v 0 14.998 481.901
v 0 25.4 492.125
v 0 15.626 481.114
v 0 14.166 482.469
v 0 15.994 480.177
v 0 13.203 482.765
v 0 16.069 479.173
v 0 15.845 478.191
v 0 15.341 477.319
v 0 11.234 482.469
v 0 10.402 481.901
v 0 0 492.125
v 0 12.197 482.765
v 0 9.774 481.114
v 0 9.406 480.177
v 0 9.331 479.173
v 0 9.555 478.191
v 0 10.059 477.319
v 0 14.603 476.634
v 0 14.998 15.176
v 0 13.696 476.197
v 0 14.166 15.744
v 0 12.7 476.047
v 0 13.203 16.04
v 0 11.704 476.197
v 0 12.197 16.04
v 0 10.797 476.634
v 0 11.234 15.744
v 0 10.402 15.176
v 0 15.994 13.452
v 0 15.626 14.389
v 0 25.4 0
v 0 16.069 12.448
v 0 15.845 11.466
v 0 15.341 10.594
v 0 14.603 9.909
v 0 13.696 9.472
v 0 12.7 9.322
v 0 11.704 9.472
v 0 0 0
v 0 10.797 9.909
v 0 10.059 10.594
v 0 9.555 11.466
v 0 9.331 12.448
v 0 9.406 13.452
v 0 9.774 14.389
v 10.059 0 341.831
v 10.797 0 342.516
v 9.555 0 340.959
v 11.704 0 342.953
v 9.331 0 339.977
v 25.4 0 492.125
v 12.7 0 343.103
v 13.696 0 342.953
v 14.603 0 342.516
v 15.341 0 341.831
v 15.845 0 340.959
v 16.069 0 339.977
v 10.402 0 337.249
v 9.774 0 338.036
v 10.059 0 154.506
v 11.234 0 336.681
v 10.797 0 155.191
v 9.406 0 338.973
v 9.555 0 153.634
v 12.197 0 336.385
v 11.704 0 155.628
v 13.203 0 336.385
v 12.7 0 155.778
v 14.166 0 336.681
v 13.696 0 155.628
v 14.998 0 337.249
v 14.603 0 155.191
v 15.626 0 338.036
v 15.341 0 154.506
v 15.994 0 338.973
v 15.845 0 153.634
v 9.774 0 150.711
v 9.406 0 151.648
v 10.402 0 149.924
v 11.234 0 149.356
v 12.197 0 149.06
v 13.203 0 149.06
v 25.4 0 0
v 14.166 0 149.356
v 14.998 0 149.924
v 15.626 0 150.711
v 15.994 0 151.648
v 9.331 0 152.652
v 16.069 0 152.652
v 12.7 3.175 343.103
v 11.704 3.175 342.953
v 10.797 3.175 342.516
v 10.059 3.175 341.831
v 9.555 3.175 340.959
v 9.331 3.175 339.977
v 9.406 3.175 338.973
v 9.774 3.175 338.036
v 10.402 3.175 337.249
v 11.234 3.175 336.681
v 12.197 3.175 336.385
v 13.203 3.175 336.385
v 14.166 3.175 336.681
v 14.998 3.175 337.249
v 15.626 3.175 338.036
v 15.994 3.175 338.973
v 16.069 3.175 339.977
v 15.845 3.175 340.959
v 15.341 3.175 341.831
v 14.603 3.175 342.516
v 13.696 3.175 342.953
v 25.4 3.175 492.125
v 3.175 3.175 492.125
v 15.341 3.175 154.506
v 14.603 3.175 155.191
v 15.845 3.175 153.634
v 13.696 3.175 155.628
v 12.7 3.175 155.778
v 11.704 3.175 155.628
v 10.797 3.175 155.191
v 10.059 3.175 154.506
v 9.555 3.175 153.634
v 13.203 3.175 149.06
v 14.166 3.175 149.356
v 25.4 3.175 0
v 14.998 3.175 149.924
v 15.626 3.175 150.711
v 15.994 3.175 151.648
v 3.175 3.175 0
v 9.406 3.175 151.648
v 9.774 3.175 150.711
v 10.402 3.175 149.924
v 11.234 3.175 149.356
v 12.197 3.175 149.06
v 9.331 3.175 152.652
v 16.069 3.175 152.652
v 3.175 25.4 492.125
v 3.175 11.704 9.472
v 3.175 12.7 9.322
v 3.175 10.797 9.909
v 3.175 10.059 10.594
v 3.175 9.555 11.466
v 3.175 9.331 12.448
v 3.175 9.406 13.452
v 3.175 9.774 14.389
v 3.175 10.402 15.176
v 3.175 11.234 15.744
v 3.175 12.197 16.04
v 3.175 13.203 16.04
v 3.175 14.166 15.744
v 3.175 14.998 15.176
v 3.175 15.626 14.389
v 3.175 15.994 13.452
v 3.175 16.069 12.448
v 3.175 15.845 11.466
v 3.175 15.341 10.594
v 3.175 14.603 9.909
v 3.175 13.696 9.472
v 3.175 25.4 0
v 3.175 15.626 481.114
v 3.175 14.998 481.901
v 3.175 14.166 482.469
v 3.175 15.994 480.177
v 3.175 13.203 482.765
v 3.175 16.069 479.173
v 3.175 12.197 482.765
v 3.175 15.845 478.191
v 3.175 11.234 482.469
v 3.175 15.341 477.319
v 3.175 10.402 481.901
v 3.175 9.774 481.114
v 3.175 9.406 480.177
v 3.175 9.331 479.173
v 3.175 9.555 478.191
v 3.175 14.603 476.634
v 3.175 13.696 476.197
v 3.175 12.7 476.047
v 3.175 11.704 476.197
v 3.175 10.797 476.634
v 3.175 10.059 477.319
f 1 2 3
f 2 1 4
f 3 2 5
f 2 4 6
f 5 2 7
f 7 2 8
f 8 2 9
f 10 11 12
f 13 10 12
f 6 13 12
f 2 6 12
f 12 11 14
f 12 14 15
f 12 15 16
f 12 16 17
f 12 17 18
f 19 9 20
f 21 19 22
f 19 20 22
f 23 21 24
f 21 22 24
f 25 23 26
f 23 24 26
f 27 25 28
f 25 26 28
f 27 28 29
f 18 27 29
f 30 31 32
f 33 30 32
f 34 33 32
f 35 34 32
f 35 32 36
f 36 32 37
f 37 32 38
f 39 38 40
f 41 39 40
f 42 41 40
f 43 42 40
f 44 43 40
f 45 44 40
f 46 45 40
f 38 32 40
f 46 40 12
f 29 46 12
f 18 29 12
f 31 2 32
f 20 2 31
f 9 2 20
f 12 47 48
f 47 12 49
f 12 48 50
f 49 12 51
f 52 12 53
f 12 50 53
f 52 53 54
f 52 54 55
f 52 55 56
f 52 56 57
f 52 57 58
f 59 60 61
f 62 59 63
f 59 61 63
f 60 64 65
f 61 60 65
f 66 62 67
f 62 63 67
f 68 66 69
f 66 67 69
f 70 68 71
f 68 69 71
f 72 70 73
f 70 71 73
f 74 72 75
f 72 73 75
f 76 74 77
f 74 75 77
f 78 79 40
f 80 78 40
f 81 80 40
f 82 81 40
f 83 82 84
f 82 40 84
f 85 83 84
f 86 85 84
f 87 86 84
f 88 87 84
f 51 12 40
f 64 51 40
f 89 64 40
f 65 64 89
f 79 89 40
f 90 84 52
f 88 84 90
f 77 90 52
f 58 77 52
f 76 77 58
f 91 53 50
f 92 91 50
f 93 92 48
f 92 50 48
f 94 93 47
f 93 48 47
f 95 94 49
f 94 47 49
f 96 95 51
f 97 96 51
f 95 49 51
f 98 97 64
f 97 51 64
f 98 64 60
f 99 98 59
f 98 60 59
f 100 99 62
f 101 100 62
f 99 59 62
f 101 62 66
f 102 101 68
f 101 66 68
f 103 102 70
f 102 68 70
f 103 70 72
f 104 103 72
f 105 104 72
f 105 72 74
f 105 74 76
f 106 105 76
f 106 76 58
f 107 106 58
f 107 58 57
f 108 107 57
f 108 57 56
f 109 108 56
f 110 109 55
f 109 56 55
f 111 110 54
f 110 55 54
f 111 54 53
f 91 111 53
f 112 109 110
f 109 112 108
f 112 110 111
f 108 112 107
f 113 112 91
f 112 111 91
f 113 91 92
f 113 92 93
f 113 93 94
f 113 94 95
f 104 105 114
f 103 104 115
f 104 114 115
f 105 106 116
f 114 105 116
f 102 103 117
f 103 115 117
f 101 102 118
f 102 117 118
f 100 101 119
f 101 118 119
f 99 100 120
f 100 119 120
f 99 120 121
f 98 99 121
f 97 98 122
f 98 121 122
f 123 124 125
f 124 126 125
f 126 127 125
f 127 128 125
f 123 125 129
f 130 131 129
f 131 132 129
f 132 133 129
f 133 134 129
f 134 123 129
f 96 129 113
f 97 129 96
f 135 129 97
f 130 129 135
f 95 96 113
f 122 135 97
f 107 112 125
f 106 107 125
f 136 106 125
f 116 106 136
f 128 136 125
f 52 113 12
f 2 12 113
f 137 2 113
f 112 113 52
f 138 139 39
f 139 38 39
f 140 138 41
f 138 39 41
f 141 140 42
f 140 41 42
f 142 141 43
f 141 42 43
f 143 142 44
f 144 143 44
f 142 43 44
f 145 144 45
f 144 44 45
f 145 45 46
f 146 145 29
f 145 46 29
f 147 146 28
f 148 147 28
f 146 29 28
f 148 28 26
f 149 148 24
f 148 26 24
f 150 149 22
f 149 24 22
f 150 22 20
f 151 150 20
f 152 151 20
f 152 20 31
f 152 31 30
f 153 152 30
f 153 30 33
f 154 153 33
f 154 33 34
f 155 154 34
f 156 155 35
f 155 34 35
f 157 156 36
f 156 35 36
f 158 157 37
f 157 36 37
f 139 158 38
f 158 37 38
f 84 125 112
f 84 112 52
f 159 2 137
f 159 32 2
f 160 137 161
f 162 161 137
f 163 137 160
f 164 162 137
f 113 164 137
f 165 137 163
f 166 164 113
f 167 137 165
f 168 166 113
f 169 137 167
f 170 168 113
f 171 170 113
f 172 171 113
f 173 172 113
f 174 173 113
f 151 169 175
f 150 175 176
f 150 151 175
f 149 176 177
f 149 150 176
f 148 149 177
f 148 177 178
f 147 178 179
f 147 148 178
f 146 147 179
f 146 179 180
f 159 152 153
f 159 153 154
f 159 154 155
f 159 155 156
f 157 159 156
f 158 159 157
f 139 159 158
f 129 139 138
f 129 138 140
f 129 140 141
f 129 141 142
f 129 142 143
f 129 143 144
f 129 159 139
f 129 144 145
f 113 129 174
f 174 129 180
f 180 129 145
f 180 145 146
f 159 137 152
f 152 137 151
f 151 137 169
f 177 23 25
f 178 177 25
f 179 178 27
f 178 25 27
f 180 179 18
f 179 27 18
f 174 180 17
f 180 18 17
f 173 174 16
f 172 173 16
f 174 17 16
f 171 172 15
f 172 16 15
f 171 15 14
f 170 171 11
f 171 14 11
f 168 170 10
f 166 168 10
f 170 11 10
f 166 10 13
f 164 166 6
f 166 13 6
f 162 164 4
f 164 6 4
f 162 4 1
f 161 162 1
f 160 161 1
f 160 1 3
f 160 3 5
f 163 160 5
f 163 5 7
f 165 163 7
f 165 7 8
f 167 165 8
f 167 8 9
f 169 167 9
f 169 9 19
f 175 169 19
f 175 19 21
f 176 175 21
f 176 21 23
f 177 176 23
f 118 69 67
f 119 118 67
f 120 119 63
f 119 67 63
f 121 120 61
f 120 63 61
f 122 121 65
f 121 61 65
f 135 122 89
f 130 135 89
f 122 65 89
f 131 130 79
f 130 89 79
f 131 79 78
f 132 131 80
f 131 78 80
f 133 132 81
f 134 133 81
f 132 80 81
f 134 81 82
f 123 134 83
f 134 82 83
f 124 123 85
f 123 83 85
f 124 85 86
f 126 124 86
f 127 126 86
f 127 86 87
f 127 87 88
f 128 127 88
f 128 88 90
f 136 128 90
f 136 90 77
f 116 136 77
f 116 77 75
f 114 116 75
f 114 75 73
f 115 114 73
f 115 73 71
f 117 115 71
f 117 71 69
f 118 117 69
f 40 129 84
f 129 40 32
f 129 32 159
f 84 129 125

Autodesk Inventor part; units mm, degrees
ref_plane "YZ Plane" through (0, 0, 0) normal (1, 0, 0) x (0, 1, 0)
ref_plane "XZ Plane" through (0, 0, 0) normal (0, 1, 0) x (-1, 0, 0)
ref_plane "XY Plane" through (0, 0, 0) normal (0, 0, 1) x (1, 0, 0)
sketch "Sketch1" plane through (0, 0, 0) normal (0, 0, 1) x (1, 0, 0)
  line L0 (0, 25.4) -> (0, 0)
  line L1 (0, 0) -> (25.4, 0)
  line L2 (3.175, 25.4) -> (3.175, 4.953)
  line L3 (4.953, 3.175) -> (25.4, 3.175)
  line L4 (0, 25.4) -> (3.175, 25.4)
  line L5 (25.4, 3.175) -> (25.4, 0)
  line L6 (3.175, 4.953) -> (3.175, 3.175)
  line L7 (4.953, 3.175) -> (3.175, 3.175)
  dimension "d0" = 25.4
  dimension "d1" = 25.4
  dimension "d2" = 3.175
extrude "Extrusion1" add sketch "Sketch1" along normal blind 492.125
sketch "Sketch7" plane through (3.175, 3.175, 0) normal (1, 0, 0) x (0, 0, -1)
  circle A0 centre (-479.425, 9.525) radius 2.8124
  line L0 (0, 22.225) -> (-492.125, 22.225) projected
  line L1 (-492.125, 0) -> (-492.125, 22.225) projected
  circle A1 centre (-12.7, 9.525) radius 2.8124
  point P0 (0, -3.175)
  dimension "d43" = 12.7
  dimension "d44" = 12.7
  dimension "d47" = 466.725
hole "Hole4" at (3.175, 12.7, 479.425) at (3.175, 12.7, 12.7) direction (-1, 0, 0) diameter 6.7564 depth 25.4 tip angle 118 clearance for "Flat Head Machine Screw (82)" size "1/4" standard "Ansi Unified Screw Threads"
sketch "Sketch8" plane through (3.175, 3.175, 0) normal (0, 1, 0) x (1, 0, 0)
  circle A0 centre (9.525, -339.725) radius 5.1637
  line L0 (22.225, 0) -> (22.225, -492.125) projected
  line L1 (22.225, -492.125) -> (0, -492.125) projected
  point P0 (-3.175, 0)
  dimension "d59" = 12.7
  dimension "d60" = 152.4
hole "Hole5" at (12.7, 3.175, 339.725) direction (0, -1, 0) diameter 6.7564 depth 25.4 tip angle 118 clearance for "Flat Head Machine Screw (82)" size "1/4" standard "Ansi Unified Screw Threads"
sketch "Sketch9" plane through (3.175, 3.175, 0) normal (0, 1, 0) x (1, 0, 0)
  circle A0 centre (9.525, -152.4) radius 4.6363
  line L0 (22.225, 0) -> (22.225, -492.125) projected
  line L1 (22.225, 0) -> (0, 0) projected
  point P0 (-3.175, 0)
  dimension "d68" = 12.7
  dimension "d69" = 152.4
hole "Hole6" at (12.7, 3.175, 152.4) direction (0, -1, 0) diameter 6.7564 depth 25.4 tip angle 118 clearance for "Flat Head Machine Screw (82)" size "1/4" standard "Ansi Unified Screw Threads"
